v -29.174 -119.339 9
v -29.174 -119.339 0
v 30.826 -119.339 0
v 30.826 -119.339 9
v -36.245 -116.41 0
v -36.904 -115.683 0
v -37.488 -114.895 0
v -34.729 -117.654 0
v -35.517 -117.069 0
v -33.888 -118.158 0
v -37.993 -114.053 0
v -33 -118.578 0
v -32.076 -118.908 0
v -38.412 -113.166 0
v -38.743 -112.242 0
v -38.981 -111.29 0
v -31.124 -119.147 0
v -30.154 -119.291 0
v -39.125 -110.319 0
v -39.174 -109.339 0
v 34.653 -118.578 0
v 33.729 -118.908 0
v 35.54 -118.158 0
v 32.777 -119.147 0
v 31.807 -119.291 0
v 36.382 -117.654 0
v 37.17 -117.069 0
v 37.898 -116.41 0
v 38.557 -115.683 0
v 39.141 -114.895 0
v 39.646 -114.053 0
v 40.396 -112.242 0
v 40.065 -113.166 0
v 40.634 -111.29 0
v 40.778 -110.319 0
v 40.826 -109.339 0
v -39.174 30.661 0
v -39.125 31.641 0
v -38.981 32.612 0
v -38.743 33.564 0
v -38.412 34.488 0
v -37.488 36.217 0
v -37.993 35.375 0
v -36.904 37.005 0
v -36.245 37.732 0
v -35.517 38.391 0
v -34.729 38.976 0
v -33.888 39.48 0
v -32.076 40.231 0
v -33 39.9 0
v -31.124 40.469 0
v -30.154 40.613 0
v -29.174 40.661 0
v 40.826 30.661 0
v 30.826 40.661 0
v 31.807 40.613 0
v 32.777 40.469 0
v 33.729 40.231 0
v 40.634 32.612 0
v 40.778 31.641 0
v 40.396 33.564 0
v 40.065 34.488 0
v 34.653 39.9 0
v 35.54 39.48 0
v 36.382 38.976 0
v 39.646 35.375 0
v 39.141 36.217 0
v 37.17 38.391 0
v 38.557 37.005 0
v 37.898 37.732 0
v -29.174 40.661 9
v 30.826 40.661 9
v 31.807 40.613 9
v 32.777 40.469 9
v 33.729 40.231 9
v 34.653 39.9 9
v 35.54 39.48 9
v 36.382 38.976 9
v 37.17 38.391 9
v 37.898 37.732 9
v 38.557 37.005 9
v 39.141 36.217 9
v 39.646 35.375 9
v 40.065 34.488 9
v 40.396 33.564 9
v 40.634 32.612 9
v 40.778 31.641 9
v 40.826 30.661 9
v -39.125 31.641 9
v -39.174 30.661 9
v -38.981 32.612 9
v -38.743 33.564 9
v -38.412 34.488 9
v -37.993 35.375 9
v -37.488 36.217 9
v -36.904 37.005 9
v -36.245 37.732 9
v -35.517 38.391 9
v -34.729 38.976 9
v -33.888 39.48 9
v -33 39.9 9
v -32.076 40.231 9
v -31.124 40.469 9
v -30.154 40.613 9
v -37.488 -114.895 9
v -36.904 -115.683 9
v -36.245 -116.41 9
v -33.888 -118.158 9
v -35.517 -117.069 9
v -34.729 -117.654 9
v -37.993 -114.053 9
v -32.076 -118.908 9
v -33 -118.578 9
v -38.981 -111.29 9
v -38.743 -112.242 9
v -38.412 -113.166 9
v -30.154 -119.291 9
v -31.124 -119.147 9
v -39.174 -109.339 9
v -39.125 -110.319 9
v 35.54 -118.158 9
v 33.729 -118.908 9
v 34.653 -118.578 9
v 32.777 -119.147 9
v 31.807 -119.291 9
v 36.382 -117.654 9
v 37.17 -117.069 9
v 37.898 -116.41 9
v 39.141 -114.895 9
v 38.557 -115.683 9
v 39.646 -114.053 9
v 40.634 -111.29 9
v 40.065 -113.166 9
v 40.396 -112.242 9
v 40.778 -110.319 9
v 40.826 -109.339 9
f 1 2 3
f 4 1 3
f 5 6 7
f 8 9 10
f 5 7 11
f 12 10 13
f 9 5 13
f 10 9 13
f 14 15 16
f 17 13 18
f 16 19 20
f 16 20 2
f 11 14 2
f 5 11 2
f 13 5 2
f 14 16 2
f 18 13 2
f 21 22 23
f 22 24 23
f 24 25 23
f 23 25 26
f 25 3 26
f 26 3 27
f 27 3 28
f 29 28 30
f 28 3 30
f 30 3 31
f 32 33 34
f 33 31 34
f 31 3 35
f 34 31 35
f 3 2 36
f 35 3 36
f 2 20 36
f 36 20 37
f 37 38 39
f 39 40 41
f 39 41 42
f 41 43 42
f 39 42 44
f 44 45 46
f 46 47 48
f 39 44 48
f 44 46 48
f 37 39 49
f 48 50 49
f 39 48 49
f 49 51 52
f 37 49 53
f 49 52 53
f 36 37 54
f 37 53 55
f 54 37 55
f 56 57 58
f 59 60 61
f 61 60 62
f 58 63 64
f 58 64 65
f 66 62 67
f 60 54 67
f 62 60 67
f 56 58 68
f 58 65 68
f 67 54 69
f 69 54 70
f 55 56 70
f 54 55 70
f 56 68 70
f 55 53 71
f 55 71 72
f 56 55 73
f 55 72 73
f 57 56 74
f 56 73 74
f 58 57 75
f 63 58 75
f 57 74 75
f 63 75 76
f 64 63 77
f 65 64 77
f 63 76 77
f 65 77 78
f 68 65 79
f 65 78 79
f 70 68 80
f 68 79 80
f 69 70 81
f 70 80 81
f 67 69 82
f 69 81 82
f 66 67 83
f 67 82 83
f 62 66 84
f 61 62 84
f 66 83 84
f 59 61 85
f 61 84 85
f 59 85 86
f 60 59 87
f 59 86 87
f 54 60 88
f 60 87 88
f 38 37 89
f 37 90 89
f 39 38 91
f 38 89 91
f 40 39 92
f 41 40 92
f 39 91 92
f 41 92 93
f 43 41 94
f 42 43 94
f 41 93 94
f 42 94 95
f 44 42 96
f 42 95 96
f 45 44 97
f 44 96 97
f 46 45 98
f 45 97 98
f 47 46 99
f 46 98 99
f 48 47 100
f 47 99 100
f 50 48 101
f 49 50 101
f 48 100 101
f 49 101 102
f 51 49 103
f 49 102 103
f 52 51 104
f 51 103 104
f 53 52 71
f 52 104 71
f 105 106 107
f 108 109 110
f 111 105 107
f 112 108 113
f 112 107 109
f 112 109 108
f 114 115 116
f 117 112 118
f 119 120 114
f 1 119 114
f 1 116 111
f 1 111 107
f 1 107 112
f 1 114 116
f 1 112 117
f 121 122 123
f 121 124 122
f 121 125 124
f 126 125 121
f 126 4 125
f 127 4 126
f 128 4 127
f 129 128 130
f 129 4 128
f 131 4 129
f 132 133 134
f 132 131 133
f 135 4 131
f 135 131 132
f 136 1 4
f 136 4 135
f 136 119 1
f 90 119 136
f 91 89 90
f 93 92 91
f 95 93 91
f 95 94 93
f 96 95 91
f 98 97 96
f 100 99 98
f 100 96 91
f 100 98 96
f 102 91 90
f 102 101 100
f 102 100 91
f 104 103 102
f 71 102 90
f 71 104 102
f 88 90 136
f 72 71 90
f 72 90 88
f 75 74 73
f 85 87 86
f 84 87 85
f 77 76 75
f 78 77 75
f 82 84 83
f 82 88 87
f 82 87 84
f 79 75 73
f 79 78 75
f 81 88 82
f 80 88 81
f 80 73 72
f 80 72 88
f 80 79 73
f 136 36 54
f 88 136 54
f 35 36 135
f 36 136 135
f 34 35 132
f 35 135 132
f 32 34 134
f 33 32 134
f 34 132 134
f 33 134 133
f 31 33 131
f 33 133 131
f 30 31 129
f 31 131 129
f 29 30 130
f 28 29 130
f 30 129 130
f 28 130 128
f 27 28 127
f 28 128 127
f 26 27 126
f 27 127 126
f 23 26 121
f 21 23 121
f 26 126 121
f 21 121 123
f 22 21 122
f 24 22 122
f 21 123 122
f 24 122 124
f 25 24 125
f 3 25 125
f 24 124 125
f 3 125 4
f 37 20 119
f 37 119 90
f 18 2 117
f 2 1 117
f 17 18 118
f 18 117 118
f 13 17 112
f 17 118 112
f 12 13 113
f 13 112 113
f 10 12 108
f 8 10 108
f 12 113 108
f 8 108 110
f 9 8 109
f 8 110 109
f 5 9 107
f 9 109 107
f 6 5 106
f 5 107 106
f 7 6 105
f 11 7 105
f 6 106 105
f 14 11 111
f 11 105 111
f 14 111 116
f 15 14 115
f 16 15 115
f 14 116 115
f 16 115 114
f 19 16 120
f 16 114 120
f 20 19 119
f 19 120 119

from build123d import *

# Parameters (mm, degrees)
SKETCH_1_W      = 80
SKETCH_1_H      = 160
EXTRUDE_1_DEPTH = 9
FILLET_1_R      = 10
FILLET_2_R      = 10
FILLET_3_R      = 10
FILLET_4_R      = 10


with BuildPart() as part:
    # 草图1 → 凸台-拉伸1 (new body)
    with BuildSketch(Plane.XY):
        with Locations((0.826446281, -39.338842975)):
            Rectangle(SKETCH_1_W, SKETCH_1_H)
    extrude(amount=EXTRUDE_1_DEPTH)

    # 圆角1
    fillet_1_edges = [part.edges().sort_by_distance(p)[0] for p in [
        (-39.173553719, 40.661157025, 4.5),
    ]]
    fillet(fillet_1_edges, radius=FILLET_1_R)

    # 圆角2
    fillet_2_edges = [part.edges().sort_by_distance(p)[0] for p in [
        (40.826446281, 40.661157025, 4.5),
    ]]
    fillet(fillet_2_edges, radius=FILLET_2_R)

    # 圆角3
    fillet_3_edges = [part.edges().sort_by_distance(p)[0] for p in [
        (40.826446281, -119.338842975, 4.5),
    ]]
    fillet(fillet_3_edges, radius=FILLET_3_R)

    # 圆角4
    fillet_4_edges = [part.edges().sort_by_distance(p)[0] for p in [
        (-39.173553719, -119.338842975, 4.5),
    ]]
    fillet(fillet_4_edges, radius=FILLET_4_R)


solid = part.part
